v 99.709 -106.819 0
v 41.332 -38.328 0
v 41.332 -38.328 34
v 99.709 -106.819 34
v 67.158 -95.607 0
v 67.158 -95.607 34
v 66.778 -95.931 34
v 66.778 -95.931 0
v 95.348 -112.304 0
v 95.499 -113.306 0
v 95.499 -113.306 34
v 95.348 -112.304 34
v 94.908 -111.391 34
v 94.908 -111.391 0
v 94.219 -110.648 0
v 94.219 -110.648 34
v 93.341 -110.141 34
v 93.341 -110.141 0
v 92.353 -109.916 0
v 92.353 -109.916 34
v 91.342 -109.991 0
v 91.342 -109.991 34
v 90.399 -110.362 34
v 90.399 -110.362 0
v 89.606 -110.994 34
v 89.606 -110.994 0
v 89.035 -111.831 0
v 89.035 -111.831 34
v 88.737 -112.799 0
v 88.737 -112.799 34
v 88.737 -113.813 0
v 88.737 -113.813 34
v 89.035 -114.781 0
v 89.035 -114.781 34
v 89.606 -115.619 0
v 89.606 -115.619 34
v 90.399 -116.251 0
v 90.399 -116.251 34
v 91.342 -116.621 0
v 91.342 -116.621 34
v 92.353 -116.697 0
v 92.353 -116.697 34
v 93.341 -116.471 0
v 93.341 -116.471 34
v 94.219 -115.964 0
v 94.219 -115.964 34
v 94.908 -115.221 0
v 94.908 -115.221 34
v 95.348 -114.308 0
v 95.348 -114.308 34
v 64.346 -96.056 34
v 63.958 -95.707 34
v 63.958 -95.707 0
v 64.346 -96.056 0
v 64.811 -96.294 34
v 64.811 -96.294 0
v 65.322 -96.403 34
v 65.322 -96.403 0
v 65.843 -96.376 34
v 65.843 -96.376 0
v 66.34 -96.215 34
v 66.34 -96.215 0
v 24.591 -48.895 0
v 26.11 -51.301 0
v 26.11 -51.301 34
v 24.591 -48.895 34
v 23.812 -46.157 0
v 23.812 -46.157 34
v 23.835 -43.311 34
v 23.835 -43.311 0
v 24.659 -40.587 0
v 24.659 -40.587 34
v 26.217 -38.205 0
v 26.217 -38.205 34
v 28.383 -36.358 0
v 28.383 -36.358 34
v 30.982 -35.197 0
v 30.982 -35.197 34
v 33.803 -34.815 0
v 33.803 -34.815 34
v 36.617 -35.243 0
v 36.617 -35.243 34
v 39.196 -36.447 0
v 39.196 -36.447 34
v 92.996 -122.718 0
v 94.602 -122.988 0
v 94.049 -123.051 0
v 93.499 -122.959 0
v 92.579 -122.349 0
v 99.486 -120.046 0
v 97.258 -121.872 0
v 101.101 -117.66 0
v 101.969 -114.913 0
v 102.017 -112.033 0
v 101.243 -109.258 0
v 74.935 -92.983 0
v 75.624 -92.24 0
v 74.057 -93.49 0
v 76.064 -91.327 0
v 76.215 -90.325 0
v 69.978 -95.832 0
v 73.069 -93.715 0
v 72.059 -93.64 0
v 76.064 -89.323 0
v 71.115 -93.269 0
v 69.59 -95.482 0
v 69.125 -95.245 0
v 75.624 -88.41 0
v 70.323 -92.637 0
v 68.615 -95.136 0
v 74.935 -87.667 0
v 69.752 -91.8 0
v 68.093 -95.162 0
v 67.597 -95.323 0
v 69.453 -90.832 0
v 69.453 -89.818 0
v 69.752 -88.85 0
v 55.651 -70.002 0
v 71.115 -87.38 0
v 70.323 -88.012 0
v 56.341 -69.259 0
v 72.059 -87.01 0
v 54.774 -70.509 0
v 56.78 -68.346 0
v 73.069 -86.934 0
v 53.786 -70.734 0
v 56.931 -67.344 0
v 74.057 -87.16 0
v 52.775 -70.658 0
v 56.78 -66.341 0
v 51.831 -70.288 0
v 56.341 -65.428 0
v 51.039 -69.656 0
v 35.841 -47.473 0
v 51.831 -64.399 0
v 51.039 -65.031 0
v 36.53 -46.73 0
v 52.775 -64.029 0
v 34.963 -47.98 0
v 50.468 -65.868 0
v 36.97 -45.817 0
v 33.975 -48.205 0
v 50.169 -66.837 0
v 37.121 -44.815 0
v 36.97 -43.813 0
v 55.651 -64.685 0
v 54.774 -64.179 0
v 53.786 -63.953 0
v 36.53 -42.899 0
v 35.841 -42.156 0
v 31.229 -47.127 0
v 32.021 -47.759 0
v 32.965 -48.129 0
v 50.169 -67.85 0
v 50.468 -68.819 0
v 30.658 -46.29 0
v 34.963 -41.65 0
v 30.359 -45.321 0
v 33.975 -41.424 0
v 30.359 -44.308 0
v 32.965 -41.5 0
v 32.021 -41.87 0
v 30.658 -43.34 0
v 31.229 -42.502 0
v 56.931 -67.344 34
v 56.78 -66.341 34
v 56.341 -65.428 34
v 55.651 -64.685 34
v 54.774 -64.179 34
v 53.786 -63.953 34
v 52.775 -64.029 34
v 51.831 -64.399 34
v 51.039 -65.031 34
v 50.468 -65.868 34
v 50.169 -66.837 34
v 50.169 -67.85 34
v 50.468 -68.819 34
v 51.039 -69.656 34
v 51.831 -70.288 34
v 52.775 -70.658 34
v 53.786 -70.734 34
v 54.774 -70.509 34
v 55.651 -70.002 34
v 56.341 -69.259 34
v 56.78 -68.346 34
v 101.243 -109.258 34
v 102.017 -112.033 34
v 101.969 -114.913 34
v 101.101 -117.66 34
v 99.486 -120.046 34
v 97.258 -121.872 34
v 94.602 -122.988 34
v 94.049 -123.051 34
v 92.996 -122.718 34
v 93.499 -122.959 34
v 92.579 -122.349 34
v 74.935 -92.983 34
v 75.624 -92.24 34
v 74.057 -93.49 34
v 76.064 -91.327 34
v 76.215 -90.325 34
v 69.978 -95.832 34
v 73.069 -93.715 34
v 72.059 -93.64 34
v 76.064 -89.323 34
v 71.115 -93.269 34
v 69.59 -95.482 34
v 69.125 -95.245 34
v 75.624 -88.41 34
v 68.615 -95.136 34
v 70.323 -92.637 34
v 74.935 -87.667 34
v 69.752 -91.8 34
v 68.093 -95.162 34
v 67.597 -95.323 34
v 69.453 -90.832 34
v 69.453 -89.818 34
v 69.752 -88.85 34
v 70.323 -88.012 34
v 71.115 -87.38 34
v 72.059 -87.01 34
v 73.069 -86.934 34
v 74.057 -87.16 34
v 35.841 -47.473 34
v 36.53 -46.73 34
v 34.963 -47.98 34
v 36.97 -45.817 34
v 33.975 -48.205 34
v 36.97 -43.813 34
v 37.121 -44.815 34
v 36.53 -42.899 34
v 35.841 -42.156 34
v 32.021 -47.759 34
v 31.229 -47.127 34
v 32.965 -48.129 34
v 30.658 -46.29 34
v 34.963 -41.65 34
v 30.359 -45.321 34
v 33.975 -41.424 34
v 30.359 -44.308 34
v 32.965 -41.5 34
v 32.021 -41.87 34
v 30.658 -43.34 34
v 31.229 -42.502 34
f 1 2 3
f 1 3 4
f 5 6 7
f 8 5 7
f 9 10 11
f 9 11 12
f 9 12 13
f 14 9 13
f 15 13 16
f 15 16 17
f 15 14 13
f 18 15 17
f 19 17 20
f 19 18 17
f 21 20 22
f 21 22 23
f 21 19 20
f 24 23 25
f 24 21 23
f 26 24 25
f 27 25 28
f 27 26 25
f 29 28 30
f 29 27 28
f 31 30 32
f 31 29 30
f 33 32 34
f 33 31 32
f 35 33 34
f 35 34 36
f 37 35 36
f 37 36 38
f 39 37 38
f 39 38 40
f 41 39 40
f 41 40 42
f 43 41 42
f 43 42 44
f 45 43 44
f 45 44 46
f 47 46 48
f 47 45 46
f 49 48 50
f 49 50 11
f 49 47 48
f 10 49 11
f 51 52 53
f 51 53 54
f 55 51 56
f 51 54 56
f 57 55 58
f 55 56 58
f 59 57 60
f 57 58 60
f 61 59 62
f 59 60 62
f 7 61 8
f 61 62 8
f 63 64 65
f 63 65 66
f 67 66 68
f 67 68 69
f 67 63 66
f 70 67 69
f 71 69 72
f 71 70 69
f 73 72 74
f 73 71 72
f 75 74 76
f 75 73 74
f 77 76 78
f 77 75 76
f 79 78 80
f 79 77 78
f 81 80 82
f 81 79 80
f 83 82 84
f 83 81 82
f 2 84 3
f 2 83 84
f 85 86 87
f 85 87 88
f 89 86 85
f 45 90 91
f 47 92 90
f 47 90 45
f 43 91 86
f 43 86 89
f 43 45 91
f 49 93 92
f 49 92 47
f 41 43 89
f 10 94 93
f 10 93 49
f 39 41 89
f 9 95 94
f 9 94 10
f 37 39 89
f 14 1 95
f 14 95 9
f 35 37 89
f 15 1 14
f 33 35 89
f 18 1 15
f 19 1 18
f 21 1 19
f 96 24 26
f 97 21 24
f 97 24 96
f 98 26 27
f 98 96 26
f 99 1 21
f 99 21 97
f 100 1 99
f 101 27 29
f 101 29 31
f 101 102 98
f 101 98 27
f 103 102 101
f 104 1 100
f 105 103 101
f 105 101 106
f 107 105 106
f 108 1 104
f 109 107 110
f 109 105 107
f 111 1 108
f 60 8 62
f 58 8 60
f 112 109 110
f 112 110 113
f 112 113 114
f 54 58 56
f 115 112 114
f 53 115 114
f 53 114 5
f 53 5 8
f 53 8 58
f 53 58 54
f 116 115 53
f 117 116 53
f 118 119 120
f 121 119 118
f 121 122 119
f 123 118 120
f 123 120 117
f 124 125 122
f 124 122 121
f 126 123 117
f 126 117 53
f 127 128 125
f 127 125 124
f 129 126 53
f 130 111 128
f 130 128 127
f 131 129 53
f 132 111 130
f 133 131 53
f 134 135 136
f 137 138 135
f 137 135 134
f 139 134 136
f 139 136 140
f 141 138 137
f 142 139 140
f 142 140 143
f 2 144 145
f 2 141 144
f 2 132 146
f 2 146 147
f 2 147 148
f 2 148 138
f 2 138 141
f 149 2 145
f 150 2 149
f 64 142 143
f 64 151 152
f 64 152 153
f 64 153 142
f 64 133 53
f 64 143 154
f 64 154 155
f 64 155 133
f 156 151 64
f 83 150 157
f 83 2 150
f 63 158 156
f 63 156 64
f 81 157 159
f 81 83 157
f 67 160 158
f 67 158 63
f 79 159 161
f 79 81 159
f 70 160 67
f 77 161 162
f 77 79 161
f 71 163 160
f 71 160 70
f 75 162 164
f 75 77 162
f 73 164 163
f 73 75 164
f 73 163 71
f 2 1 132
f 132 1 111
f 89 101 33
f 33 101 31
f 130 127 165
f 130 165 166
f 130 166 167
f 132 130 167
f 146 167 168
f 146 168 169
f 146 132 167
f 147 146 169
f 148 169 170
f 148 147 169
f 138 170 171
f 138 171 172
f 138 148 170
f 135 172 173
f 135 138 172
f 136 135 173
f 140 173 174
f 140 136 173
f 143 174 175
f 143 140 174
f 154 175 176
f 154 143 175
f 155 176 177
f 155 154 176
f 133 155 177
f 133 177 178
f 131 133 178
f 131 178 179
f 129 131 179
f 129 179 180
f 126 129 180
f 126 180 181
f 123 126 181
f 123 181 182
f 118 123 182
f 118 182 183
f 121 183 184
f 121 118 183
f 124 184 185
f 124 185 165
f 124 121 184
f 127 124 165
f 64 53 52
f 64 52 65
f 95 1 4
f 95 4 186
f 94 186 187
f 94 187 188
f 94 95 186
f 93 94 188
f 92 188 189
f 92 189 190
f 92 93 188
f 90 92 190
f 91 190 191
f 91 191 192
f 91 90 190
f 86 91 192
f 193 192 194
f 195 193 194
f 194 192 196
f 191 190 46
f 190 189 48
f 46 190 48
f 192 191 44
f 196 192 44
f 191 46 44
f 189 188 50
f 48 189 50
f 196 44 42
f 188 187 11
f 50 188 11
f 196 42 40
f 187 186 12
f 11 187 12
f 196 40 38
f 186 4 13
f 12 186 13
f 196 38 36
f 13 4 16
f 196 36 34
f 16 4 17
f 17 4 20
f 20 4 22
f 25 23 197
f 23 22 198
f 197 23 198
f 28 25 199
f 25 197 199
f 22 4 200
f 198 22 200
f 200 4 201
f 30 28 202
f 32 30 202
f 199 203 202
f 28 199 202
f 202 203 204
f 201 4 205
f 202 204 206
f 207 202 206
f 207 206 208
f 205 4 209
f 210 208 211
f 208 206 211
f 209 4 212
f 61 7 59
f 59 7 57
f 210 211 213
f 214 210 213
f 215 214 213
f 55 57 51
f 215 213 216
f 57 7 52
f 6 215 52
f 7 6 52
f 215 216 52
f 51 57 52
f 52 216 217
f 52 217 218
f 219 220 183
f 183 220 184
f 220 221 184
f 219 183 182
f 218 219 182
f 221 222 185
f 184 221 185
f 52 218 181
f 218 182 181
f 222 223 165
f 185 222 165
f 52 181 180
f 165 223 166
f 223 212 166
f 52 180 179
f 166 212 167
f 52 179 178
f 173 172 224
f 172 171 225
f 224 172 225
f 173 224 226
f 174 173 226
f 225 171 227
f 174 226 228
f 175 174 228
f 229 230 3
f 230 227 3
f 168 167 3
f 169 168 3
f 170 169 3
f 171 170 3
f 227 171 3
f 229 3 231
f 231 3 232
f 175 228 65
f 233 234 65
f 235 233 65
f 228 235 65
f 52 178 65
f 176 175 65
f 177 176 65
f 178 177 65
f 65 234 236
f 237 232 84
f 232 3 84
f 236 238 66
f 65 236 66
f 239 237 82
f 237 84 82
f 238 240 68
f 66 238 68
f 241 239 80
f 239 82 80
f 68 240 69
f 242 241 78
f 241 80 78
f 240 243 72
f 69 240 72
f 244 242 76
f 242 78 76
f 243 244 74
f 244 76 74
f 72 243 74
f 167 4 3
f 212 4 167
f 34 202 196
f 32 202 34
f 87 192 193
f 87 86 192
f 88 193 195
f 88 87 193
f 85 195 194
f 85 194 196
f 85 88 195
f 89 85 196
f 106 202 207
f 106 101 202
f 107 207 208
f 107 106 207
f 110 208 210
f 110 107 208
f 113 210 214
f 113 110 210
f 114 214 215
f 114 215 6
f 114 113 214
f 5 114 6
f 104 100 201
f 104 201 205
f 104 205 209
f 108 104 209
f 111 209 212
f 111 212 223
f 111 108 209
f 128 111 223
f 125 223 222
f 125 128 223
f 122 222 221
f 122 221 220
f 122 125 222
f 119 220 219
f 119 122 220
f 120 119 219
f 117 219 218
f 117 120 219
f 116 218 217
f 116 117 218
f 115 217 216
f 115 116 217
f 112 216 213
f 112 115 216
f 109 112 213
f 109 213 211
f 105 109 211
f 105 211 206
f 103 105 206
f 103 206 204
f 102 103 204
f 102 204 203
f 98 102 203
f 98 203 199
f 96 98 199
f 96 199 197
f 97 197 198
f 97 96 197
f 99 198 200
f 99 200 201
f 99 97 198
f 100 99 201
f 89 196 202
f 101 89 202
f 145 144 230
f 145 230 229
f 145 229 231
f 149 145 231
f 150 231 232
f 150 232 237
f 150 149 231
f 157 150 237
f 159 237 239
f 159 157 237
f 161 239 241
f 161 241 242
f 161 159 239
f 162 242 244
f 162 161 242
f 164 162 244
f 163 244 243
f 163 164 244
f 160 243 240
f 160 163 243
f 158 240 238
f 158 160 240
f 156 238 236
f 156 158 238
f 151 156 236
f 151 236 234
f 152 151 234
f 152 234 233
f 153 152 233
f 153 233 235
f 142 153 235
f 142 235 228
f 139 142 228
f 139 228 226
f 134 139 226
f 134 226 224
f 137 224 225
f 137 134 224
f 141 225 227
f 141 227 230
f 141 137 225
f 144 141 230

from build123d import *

# Parameters (mm, degrees)
SKETCH_1_R          = 3.4
EXTRUDE_3_DEPTH     = 34
CUT_EXTRUDE_1_DEPTH = 164.659924305
FILLET_1_R          = 2


with BuildPart() as part:
    # 草图1 → 凸台-拉伸3 (new body)
    with BuildSketch(Plane.XY):
        with BuildLine():
            Line((41.331697392, -38.327914958), (99.709351413, -106.819410926))
            ThreePointArc((99.709351413, -106.819410926), (98.585524286, -120.916822482), (84.48811273, -119.792995355))
            Line((84.48811273, -119.792995355), (26.110458709, -51.301499387))
            ThreePointArc((26.110458709, -51.301499387), (27.234285836, -37.204087831), (41.331697392, -38.327914958))
        make_face()
        with Locations((33.721078051, -44.814707172)):
            Circle(SKETCH_1_R, mode=Mode.SUBTRACT)
        with Locations((53.53147549, -67.343536554)):
            Circle(SKETCH_1_R, mode=Mode.SUBTRACT)
        with Locations((72.815103781, -90.324869847)):
            Circle(SKETCH_1_R, mode=Mode.SUBTRACT)
        with Locations((92.098732071, -113.306203141)):
            Circle(SKETCH_1_R, mode=Mode.SUBTRACT)
    extrude(amount=EXTRUDE_3_DEPTH)

    # 草图2 → 切除-拉伸1 (cut, through all)
    with BuildSketch(Plane.XY.offset(34)):
        with BuildLine():
            ThreePointArc((84.48811273, -119.792995355), (88.47574874, -122.626824996), (93.330431012, -123.230059131))
            Line((93.330431012, -123.230059131), (68.680620596, -94.309705633))
            Line((68.680620596, -94.309705633), (65.255841892, -97.228762129))
            Line((65.255841892, -97.228762129), (84.48811273, -119.792995355))
        make_face()
    extrude(amount=-CUT_EXTRUDE_1_DEPTH, mode=Mode.SUBTRACT)

    # 圆角1
    fillet_1_edges = [part.edges().sort_by_distance(p)[0] for p in [
        (68.680620596, -94.309705633, 17),
        (93.330431012, -123.230059131, 17),
        (65.255841892, -97.228762129, 17),
    ]]
    fillet(fillet_1_edges, radius=FILLET_1_R)


solid = part.part
